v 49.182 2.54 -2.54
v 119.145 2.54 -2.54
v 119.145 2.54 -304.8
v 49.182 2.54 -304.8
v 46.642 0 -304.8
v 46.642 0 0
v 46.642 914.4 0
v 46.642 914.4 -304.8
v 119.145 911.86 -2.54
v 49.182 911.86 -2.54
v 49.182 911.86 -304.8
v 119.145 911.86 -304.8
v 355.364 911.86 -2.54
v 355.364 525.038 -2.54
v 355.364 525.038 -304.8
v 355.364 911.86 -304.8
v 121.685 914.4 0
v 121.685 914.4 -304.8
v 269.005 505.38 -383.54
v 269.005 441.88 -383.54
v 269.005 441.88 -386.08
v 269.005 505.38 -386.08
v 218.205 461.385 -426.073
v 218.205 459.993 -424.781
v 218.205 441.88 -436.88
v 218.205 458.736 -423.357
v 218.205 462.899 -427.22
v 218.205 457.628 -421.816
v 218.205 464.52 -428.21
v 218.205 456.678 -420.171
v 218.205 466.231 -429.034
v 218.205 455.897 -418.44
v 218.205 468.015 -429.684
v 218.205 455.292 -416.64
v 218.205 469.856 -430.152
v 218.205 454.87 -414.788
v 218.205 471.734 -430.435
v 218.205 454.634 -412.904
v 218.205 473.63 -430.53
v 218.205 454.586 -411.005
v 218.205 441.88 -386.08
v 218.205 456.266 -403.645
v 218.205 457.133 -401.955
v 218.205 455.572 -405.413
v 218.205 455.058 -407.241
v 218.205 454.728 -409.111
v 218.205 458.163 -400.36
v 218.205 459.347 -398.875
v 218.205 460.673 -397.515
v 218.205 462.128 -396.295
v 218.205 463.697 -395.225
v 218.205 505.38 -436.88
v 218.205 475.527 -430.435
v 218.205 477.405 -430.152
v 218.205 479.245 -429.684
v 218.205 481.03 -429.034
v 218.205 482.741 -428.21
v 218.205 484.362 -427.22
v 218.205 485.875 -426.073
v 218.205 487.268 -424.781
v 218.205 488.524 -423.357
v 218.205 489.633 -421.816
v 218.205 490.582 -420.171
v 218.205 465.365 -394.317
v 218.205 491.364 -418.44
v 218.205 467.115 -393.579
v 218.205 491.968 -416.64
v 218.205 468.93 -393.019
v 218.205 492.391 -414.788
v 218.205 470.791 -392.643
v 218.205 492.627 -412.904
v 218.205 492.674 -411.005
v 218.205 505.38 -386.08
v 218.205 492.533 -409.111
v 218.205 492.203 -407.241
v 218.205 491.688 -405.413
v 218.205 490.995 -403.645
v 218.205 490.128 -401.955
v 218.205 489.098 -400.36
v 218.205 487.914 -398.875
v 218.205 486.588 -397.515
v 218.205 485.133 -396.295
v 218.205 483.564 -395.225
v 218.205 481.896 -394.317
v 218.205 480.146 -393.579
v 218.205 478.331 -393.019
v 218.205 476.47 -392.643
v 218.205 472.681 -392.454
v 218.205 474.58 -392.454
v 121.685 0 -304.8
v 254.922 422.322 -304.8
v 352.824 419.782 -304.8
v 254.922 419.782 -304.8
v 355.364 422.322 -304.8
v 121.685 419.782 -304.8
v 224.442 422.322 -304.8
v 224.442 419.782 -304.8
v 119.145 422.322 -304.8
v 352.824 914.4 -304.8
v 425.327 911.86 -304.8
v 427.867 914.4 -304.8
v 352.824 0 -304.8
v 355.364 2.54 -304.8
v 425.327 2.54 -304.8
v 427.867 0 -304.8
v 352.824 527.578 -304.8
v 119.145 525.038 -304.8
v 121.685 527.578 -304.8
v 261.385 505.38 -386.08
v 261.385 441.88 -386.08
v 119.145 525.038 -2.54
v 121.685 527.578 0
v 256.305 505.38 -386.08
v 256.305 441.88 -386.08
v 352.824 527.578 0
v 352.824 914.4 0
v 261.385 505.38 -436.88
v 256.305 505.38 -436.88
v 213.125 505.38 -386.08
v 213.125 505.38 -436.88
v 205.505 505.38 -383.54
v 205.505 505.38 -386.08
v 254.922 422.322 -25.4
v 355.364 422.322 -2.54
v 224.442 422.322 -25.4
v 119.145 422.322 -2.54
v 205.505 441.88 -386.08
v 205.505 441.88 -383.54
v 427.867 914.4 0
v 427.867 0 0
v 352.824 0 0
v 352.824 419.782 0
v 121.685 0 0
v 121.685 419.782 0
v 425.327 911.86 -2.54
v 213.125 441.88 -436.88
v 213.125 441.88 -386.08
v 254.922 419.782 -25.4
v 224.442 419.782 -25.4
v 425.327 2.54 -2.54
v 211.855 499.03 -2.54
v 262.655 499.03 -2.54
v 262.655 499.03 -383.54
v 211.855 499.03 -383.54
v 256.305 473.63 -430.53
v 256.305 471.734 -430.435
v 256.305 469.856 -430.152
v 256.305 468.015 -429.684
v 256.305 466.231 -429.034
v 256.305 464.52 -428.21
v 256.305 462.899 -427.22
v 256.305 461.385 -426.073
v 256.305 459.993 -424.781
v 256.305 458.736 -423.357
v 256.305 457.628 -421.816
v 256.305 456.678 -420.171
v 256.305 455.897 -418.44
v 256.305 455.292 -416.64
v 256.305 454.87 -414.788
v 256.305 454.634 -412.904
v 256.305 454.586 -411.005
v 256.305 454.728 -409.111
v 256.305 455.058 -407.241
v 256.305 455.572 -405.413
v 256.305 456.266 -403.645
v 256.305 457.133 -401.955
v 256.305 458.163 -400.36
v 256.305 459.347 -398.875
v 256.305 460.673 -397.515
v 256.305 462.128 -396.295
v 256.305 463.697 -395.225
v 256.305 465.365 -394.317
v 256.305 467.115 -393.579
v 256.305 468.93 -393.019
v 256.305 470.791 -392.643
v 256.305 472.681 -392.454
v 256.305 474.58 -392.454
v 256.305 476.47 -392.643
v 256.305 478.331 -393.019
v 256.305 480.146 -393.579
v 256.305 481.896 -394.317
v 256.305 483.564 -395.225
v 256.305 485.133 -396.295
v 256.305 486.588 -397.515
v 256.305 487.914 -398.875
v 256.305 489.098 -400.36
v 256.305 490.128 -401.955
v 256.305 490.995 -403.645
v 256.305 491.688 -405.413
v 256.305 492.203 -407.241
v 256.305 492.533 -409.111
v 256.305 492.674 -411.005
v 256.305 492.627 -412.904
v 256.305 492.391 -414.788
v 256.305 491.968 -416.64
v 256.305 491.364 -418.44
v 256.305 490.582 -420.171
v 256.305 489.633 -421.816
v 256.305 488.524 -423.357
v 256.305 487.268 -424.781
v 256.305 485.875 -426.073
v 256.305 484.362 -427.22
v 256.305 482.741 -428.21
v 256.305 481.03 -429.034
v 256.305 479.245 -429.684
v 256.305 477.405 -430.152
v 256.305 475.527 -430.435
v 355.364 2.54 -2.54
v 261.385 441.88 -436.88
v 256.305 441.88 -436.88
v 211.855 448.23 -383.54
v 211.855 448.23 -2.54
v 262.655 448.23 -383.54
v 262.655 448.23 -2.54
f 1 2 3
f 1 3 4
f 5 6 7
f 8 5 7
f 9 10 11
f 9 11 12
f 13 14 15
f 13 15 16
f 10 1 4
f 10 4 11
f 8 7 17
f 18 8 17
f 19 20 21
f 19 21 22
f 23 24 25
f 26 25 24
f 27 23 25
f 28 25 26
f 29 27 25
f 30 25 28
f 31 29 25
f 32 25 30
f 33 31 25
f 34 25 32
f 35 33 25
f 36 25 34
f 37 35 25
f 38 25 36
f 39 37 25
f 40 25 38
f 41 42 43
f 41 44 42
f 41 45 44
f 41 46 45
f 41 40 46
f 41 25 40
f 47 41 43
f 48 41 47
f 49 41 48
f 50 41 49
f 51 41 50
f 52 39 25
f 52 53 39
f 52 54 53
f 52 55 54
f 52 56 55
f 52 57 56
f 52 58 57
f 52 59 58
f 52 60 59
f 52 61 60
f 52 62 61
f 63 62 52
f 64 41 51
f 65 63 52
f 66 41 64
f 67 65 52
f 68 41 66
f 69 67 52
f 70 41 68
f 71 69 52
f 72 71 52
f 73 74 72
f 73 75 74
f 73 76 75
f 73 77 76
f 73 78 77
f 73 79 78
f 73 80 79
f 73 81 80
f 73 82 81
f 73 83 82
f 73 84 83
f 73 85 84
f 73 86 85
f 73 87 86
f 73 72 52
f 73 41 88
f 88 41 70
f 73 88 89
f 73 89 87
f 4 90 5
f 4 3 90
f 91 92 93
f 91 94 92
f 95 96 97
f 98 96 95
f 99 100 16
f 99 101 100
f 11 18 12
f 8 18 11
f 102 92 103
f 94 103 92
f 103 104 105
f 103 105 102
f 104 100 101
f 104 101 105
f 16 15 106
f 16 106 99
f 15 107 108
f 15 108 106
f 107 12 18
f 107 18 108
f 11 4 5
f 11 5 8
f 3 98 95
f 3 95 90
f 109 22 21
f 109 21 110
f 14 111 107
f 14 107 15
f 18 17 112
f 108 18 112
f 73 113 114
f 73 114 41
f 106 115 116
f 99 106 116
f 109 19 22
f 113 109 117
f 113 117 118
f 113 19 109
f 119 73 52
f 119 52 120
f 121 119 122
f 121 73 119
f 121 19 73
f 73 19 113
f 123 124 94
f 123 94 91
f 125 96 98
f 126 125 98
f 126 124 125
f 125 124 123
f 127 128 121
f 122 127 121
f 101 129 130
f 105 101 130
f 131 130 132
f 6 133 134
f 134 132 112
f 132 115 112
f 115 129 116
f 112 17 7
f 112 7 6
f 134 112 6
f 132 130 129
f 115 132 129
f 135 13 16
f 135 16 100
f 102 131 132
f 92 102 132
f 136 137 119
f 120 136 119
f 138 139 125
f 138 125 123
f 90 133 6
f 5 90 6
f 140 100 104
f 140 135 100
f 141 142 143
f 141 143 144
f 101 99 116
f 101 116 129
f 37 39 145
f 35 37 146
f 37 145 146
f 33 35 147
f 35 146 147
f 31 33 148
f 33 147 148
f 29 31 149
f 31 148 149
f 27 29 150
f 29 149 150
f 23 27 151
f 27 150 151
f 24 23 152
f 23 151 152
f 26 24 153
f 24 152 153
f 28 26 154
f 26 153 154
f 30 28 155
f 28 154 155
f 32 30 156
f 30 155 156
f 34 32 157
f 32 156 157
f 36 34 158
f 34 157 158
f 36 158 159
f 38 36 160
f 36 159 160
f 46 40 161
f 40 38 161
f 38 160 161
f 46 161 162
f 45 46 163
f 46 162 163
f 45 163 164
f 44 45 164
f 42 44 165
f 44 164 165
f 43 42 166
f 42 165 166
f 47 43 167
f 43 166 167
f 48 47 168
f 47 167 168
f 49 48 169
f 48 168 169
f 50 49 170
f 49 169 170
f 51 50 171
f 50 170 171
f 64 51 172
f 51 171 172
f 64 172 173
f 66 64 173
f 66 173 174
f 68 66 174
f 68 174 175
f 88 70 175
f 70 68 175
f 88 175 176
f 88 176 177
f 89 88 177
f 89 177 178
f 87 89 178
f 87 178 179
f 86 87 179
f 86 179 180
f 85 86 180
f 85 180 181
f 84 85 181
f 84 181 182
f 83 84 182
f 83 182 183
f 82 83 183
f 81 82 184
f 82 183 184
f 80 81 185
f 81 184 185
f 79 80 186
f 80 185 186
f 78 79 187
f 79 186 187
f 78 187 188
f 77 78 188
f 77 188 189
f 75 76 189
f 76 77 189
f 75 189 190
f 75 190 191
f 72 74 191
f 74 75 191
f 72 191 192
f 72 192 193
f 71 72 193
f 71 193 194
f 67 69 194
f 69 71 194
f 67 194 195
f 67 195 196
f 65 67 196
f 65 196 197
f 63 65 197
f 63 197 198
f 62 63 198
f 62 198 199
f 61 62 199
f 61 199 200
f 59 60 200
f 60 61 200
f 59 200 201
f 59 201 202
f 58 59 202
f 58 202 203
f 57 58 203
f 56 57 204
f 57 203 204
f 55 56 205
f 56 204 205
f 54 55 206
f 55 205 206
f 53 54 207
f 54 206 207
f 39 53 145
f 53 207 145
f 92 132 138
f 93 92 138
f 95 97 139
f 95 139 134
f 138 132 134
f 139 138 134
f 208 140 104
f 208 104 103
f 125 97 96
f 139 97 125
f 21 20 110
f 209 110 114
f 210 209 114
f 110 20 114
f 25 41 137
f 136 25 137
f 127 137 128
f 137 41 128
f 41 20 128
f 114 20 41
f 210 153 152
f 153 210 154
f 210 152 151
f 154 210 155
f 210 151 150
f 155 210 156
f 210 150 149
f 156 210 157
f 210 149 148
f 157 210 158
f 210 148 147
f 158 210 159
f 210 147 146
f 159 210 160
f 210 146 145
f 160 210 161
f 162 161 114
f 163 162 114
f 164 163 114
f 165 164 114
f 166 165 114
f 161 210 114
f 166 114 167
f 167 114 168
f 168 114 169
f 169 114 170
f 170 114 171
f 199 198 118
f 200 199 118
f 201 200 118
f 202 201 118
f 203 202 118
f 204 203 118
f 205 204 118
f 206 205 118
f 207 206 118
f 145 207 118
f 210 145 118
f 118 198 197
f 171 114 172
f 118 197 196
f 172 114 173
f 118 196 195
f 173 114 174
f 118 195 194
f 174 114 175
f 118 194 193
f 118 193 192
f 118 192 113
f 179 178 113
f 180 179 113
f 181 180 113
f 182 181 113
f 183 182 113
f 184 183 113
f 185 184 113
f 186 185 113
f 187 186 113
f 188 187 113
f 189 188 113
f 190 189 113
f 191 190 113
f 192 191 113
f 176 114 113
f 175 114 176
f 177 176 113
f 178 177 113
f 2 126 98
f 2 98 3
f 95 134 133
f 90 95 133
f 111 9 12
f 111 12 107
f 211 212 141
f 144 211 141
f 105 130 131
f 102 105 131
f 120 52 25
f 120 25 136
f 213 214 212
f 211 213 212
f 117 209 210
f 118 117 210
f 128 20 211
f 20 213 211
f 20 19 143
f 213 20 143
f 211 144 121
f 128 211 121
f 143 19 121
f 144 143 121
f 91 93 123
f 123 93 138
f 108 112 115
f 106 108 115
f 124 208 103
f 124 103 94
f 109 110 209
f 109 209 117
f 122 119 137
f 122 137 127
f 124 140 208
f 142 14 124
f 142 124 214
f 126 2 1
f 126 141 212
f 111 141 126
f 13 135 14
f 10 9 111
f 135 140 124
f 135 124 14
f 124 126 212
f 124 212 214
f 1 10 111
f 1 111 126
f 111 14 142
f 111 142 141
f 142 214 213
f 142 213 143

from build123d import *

# Parameters (mm, degrees)
BOSS_EXTRUDE1_DEPTH = 304.8
SHELL1_T            = -2.54
SKETCH4_W           = 50.8
SKETCH4_H           = 50.8
BOSS_EXTRUDE2_DEPTH = 381
SKETCH5_W           = 30.48
SKETCH5_H           = 279.4
CUT_EXTRUDE1_DEPTH  = 7.62
SKETCH6_W           = 63.5
SKETCH6_H           = 63.5
BOSS_EXTRUDE3_DEPTH = 2.54
SKETCH7_W           = 5.08
SKETCH7_H           = 63.5
BOSS_EXTRUDE4_DEPTH = 50.8
BOSS_EXTRUDE5_REACH = 1036.867
SKETCH8_R           = 19.05


with BuildPart() as part:
    # Sketch3 → Boss-Extrude1 (new body)
    with BuildSketch(Plane.XY):
        Polygon((427.867059624, 0), (352.824484244, 0), (352.824484244, 419.782362276), (121.685060077, 419.782362276), (121.685060077, 0), (46.642484697, 0), (46.642484697, 914.4), (121.685060077, 914.4), (121.685060077, 527.57832691), (352.824484244, 527.57832691), (352.824484244, 914.4), (427.867059624, 914.4), align=None)
    extrude(amount=-BOSS_EXTRUDE1_DEPTH)

    # Shell1
    shell1_openings = [part.faces().sort_by_distance(p)[0] for p in [
        (237.254772161, 459.732303747, -304.8),
    ]]
    offset(amount=SHELL1_T, openings=shell1_openings, kind=Kind.INTERSECTION)

    # Sketch4 → Boss-Extrude2 (add)
    with BuildSketch(Plane(origin=(0, 0, -2.54), x_dir=(-1, 0, 0), z_dir=(0, 0, -1))):
        with Locations((-237.254772161, 473.630362276)):
            Rectangle(SKETCH4_W, SKETCH4_H)
    extrude(amount=BOSS_EXTRUDE2_DEPTH)

    # Sketch5 → Cut-Extrude1 (cut)
    with BuildSketch(Plane.XZ.offset(-419.782362276)):
        with Locations((239.682484697, -165.1)):
            Rectangle(SKETCH5_W, SKETCH5_H)
    extrude(amount=-CUT_EXTRUDE1_DEPTH, mode=Mode.SUBTRACT)

    # Sketch6 → Boss-Extrude3 (add)
    with BuildSketch(Plane(origin=(0, 0, -383.54), x_dir=(-1, 0, 0), z_dir=(0, 0, -1))):
        with Locations((-237.254772161, 473.630362276)):
            Rectangle(SKETCH6_W, SKETCH6_H)
    extrude(amount=BOSS_EXTRUDE3_DEPTH)

    # Sketch7 → Boss-Extrude4 (add)
    with BuildSketch(Plane(origin=(0, 0, -386.08), x_dir=(-1, 0, 0), z_dir=(0, 0, -1))):
        with Locations((-258.844772161, 473.630362276)):
            Rectangle(SKETCH7_W, SKETCH7_H)
        with Locations((-215.664772161, 473.630362276)):
            Rectangle(SKETCH7_W, SKETCH7_H)
    extrude(amount=BOSS_EXTRUDE4_DEPTH)

    # Sketch8 → Boss-Extrude5 (add, up to next)
    with BuildSketch(Plane.ZY.offset(-256.304772161), mode=Mode.PRIVATE) as boss_extrude5_sk1:
        with Locations(Location((-411.48, 473.630362276, 0), (0, 0, 180))):
            Circle(SKETCH8_R)
    boss_extrude5_tool1 = extrude(boss_extrude5_sk1.sketch, amount=BOSS_EXTRUDE5_REACH, mode=Mode.PRIVATE) - part.part
    add(boss_extrude5_tool1.solids().sort_by_distance((256.304772, 473.630362, -411.48))[0])


solid = part.part
